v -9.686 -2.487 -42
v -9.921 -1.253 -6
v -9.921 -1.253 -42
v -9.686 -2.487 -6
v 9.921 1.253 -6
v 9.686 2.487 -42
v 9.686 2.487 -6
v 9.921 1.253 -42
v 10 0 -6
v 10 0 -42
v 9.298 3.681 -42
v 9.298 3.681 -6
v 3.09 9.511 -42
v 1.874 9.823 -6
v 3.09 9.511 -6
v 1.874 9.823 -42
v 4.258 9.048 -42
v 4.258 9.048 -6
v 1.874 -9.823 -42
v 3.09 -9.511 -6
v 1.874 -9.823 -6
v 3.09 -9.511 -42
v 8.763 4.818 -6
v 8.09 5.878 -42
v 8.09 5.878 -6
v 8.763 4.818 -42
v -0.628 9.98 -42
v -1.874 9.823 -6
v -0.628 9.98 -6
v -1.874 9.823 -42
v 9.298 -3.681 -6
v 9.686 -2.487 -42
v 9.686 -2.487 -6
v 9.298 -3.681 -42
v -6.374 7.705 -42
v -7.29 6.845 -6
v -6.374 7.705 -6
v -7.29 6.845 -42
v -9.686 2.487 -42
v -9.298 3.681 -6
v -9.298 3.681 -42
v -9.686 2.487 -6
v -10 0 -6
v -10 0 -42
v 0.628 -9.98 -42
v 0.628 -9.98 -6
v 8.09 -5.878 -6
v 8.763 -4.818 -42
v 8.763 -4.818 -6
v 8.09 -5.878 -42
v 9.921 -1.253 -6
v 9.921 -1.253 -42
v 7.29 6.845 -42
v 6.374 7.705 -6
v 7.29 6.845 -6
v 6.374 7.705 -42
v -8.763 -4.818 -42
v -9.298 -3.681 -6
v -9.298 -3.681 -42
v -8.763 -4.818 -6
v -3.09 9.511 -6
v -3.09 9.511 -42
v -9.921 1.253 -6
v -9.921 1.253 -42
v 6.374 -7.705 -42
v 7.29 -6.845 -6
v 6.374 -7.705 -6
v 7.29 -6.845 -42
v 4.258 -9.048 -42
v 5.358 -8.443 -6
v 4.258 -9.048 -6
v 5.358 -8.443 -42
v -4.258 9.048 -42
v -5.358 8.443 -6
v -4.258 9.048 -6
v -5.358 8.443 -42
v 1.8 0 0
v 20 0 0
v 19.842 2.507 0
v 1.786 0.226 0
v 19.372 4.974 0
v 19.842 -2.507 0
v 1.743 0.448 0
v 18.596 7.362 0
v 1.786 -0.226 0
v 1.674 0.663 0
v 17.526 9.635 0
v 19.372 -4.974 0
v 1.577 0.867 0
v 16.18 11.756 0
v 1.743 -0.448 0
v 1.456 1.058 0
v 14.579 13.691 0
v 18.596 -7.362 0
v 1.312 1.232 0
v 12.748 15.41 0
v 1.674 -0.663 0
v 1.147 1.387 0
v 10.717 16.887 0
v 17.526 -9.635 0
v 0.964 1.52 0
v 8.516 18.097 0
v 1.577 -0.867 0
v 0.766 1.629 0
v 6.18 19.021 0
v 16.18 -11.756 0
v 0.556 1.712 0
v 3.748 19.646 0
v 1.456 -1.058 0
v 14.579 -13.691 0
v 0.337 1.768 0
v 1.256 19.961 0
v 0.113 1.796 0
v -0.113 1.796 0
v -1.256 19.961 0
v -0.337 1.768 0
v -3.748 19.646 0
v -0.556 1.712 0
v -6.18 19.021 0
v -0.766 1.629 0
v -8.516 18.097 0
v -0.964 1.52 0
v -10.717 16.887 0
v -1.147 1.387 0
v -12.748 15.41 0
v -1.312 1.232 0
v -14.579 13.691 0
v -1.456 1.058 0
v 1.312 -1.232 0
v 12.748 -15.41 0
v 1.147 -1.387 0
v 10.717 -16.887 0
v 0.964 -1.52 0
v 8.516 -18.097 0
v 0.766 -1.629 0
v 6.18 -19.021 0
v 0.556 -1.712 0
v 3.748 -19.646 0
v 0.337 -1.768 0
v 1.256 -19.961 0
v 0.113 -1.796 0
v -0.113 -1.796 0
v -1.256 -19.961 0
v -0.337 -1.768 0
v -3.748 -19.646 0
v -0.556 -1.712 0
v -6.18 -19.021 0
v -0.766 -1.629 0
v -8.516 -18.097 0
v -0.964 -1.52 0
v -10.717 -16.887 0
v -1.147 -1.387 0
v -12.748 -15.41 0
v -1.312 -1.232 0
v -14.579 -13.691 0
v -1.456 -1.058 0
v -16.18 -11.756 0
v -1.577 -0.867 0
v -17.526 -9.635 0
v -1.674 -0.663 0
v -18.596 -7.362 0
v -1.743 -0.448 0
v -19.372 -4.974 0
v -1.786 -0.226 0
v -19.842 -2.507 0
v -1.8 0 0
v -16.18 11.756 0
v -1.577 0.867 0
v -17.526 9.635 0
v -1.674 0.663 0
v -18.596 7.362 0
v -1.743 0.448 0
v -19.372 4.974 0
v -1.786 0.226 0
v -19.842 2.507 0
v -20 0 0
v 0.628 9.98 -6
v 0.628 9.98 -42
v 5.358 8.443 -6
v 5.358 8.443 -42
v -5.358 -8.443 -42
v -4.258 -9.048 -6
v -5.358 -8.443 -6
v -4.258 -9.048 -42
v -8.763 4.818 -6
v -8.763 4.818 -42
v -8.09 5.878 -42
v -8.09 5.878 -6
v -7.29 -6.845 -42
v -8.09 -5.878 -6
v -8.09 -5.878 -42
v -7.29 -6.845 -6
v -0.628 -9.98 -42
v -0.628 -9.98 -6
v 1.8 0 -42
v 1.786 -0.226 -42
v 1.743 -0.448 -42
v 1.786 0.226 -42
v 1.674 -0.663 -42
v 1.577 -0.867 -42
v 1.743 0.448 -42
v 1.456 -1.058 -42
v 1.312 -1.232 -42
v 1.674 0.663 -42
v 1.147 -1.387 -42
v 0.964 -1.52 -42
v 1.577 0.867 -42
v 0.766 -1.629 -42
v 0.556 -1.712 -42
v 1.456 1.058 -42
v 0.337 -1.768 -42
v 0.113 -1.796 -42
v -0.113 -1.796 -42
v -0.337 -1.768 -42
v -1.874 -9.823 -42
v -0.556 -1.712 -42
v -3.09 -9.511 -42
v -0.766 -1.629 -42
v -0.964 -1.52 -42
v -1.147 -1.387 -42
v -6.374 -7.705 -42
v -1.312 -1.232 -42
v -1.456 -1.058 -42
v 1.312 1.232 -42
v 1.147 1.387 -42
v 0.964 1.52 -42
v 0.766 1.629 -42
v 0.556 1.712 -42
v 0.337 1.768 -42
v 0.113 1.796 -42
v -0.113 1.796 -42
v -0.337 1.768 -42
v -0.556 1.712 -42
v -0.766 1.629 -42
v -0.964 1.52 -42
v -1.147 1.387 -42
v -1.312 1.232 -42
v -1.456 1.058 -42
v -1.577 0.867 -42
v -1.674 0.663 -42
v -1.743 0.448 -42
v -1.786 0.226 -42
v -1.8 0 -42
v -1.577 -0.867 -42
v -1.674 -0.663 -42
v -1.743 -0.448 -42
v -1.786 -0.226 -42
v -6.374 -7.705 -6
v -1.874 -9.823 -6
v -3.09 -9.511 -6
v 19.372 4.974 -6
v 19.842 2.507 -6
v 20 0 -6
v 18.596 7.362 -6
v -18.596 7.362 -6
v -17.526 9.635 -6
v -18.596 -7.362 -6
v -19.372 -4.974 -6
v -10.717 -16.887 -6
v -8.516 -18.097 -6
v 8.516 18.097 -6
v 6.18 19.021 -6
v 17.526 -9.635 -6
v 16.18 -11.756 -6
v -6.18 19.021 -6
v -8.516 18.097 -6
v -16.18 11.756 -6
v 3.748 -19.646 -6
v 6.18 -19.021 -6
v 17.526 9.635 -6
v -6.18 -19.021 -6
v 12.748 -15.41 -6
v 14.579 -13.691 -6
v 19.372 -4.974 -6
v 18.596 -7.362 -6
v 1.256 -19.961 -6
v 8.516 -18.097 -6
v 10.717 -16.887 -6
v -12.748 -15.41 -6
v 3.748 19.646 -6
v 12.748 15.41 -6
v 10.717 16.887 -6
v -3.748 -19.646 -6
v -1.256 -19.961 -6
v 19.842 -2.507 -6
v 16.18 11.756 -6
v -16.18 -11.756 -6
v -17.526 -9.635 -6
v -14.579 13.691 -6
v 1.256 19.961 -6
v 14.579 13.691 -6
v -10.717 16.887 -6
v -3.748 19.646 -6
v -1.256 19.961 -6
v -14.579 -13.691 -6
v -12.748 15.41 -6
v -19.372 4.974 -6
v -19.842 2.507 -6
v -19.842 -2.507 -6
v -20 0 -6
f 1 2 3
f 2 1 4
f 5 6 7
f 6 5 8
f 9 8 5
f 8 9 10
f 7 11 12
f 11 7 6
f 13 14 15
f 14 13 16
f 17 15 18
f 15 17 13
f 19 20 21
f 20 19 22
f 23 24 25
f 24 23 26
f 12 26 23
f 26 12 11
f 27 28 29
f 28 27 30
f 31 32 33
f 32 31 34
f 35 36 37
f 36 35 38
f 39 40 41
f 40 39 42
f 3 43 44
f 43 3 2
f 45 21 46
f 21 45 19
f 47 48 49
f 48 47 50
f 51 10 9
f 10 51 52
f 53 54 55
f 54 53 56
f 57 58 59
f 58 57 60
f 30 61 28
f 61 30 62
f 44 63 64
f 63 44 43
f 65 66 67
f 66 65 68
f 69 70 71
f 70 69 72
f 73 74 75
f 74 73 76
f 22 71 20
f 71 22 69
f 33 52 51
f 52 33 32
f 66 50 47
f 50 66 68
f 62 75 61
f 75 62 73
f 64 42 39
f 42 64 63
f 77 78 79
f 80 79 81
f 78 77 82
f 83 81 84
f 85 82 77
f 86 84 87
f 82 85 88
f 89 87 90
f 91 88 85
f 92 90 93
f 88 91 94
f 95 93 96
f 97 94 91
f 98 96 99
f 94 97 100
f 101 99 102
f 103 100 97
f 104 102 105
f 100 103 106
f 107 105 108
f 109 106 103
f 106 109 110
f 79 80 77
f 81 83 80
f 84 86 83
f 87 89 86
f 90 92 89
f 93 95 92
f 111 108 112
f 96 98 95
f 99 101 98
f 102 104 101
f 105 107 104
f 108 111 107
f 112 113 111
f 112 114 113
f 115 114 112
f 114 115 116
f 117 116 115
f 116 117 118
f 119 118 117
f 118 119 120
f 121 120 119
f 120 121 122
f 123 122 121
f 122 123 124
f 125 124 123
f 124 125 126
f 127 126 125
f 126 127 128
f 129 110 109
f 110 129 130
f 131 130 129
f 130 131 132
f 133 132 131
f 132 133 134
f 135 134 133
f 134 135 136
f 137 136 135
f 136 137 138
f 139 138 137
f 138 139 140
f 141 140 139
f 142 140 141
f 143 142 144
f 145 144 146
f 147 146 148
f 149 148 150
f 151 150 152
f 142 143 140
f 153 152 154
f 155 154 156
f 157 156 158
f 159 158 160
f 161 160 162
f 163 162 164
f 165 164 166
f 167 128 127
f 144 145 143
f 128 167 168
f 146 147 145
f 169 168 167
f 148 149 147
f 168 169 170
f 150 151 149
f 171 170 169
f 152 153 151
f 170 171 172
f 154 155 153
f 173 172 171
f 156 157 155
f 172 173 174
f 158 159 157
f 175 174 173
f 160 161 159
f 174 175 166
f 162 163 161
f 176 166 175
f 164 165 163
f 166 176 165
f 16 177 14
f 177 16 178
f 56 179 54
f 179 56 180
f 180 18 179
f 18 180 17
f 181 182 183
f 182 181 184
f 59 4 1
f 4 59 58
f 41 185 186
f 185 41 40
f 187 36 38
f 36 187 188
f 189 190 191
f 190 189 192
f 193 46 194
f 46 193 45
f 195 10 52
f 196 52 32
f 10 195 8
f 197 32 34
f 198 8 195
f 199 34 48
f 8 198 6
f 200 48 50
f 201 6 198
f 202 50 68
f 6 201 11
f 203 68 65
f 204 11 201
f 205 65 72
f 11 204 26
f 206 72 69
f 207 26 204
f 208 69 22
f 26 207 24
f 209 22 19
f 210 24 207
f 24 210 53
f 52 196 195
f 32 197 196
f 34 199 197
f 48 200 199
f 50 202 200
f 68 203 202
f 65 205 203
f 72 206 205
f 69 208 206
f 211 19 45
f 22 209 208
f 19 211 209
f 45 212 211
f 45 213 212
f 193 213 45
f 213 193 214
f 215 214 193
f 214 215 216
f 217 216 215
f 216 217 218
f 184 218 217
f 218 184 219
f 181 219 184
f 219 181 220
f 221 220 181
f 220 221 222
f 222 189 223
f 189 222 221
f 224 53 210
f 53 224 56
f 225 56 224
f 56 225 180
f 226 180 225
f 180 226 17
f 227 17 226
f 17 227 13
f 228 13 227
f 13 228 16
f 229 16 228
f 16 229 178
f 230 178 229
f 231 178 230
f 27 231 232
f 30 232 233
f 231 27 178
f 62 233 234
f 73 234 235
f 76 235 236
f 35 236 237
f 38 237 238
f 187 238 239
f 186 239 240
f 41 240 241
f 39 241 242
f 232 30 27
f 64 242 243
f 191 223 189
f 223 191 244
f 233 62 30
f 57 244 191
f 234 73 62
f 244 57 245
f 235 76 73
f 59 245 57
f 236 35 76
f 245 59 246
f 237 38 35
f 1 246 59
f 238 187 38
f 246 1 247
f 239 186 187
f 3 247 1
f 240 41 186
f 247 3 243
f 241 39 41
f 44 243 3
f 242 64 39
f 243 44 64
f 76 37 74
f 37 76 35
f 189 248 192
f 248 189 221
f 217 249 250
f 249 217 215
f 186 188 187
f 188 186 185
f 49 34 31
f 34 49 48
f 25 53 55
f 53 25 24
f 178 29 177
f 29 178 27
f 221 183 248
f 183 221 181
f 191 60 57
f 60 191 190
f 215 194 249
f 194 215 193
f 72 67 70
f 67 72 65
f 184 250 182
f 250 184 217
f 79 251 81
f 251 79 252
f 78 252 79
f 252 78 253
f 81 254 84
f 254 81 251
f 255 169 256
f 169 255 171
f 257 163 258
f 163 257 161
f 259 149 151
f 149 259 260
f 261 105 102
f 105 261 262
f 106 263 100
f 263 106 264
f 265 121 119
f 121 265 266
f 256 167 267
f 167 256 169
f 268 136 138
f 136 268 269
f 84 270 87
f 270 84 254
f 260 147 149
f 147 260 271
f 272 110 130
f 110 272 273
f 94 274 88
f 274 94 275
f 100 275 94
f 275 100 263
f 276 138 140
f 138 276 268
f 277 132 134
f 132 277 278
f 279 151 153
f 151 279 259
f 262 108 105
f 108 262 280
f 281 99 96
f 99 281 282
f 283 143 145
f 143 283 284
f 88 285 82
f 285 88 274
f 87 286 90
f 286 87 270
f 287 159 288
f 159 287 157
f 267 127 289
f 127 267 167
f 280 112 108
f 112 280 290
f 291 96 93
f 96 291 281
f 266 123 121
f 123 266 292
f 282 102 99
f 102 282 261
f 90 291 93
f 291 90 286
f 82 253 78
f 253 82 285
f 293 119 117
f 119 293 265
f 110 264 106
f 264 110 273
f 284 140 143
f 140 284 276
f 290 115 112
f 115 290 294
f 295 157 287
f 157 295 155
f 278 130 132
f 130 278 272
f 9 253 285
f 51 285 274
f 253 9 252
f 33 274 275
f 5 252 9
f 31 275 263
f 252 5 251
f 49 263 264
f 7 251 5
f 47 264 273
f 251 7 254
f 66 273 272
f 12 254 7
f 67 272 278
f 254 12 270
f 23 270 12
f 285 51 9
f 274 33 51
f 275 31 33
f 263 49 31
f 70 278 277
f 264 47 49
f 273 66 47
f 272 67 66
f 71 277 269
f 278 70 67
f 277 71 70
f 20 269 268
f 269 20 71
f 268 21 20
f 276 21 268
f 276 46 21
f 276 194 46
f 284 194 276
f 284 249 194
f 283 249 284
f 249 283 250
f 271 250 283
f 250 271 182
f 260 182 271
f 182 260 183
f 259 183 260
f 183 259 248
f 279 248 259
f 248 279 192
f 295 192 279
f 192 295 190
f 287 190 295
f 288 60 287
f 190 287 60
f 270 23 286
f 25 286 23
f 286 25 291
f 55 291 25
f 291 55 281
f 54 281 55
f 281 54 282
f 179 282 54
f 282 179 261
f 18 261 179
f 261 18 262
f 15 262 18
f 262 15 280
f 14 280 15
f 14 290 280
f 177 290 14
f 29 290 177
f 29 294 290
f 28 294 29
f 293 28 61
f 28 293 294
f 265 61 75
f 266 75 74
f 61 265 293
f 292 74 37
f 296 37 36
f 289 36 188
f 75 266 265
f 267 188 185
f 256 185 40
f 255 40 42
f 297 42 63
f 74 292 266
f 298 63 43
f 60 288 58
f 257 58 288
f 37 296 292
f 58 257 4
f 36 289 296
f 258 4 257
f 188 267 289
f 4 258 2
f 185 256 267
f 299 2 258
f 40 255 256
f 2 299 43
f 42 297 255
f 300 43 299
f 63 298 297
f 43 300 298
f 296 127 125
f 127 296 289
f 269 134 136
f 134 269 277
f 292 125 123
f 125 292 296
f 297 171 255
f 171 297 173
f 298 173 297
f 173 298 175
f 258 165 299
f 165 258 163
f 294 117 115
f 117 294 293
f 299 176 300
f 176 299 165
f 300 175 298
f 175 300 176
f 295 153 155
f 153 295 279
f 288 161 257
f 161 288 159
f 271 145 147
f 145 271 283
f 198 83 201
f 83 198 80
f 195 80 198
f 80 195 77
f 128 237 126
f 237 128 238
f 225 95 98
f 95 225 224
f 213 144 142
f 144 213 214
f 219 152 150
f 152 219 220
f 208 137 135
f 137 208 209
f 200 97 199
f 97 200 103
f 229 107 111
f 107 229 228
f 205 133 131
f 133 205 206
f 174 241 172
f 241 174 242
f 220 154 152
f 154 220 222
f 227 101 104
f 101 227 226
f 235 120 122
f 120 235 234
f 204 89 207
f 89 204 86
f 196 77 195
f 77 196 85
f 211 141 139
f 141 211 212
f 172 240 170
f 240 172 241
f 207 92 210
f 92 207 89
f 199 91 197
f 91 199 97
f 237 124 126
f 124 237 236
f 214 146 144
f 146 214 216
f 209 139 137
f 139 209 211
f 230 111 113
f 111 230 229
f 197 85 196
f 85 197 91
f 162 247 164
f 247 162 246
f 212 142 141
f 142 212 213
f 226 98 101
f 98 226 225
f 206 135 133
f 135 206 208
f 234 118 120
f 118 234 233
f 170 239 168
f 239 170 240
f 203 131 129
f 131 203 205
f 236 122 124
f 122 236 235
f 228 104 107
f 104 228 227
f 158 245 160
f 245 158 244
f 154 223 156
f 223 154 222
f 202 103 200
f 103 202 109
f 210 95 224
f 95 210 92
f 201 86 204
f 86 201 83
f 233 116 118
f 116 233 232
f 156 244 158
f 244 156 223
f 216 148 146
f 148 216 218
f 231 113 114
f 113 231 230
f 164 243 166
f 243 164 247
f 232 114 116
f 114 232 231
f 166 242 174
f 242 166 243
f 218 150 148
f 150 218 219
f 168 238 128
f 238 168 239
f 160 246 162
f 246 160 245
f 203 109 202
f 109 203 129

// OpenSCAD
$fn = 50;


difference() {
	union() {
		translate(v = [0, 0, -42.0000000000]) {
			cylinder(h = 42, r = 10.0000000000);
		}
		translate(v = [0, 0, -6.0000000000]) {
			cylinder(h = 6, r = 20.0000000000);
		}
	}
	union() {
		#translate(v = [0, 0, -42]) {
			cylinder(h = 42, r = 1.8000000000);
		}
	}
}
